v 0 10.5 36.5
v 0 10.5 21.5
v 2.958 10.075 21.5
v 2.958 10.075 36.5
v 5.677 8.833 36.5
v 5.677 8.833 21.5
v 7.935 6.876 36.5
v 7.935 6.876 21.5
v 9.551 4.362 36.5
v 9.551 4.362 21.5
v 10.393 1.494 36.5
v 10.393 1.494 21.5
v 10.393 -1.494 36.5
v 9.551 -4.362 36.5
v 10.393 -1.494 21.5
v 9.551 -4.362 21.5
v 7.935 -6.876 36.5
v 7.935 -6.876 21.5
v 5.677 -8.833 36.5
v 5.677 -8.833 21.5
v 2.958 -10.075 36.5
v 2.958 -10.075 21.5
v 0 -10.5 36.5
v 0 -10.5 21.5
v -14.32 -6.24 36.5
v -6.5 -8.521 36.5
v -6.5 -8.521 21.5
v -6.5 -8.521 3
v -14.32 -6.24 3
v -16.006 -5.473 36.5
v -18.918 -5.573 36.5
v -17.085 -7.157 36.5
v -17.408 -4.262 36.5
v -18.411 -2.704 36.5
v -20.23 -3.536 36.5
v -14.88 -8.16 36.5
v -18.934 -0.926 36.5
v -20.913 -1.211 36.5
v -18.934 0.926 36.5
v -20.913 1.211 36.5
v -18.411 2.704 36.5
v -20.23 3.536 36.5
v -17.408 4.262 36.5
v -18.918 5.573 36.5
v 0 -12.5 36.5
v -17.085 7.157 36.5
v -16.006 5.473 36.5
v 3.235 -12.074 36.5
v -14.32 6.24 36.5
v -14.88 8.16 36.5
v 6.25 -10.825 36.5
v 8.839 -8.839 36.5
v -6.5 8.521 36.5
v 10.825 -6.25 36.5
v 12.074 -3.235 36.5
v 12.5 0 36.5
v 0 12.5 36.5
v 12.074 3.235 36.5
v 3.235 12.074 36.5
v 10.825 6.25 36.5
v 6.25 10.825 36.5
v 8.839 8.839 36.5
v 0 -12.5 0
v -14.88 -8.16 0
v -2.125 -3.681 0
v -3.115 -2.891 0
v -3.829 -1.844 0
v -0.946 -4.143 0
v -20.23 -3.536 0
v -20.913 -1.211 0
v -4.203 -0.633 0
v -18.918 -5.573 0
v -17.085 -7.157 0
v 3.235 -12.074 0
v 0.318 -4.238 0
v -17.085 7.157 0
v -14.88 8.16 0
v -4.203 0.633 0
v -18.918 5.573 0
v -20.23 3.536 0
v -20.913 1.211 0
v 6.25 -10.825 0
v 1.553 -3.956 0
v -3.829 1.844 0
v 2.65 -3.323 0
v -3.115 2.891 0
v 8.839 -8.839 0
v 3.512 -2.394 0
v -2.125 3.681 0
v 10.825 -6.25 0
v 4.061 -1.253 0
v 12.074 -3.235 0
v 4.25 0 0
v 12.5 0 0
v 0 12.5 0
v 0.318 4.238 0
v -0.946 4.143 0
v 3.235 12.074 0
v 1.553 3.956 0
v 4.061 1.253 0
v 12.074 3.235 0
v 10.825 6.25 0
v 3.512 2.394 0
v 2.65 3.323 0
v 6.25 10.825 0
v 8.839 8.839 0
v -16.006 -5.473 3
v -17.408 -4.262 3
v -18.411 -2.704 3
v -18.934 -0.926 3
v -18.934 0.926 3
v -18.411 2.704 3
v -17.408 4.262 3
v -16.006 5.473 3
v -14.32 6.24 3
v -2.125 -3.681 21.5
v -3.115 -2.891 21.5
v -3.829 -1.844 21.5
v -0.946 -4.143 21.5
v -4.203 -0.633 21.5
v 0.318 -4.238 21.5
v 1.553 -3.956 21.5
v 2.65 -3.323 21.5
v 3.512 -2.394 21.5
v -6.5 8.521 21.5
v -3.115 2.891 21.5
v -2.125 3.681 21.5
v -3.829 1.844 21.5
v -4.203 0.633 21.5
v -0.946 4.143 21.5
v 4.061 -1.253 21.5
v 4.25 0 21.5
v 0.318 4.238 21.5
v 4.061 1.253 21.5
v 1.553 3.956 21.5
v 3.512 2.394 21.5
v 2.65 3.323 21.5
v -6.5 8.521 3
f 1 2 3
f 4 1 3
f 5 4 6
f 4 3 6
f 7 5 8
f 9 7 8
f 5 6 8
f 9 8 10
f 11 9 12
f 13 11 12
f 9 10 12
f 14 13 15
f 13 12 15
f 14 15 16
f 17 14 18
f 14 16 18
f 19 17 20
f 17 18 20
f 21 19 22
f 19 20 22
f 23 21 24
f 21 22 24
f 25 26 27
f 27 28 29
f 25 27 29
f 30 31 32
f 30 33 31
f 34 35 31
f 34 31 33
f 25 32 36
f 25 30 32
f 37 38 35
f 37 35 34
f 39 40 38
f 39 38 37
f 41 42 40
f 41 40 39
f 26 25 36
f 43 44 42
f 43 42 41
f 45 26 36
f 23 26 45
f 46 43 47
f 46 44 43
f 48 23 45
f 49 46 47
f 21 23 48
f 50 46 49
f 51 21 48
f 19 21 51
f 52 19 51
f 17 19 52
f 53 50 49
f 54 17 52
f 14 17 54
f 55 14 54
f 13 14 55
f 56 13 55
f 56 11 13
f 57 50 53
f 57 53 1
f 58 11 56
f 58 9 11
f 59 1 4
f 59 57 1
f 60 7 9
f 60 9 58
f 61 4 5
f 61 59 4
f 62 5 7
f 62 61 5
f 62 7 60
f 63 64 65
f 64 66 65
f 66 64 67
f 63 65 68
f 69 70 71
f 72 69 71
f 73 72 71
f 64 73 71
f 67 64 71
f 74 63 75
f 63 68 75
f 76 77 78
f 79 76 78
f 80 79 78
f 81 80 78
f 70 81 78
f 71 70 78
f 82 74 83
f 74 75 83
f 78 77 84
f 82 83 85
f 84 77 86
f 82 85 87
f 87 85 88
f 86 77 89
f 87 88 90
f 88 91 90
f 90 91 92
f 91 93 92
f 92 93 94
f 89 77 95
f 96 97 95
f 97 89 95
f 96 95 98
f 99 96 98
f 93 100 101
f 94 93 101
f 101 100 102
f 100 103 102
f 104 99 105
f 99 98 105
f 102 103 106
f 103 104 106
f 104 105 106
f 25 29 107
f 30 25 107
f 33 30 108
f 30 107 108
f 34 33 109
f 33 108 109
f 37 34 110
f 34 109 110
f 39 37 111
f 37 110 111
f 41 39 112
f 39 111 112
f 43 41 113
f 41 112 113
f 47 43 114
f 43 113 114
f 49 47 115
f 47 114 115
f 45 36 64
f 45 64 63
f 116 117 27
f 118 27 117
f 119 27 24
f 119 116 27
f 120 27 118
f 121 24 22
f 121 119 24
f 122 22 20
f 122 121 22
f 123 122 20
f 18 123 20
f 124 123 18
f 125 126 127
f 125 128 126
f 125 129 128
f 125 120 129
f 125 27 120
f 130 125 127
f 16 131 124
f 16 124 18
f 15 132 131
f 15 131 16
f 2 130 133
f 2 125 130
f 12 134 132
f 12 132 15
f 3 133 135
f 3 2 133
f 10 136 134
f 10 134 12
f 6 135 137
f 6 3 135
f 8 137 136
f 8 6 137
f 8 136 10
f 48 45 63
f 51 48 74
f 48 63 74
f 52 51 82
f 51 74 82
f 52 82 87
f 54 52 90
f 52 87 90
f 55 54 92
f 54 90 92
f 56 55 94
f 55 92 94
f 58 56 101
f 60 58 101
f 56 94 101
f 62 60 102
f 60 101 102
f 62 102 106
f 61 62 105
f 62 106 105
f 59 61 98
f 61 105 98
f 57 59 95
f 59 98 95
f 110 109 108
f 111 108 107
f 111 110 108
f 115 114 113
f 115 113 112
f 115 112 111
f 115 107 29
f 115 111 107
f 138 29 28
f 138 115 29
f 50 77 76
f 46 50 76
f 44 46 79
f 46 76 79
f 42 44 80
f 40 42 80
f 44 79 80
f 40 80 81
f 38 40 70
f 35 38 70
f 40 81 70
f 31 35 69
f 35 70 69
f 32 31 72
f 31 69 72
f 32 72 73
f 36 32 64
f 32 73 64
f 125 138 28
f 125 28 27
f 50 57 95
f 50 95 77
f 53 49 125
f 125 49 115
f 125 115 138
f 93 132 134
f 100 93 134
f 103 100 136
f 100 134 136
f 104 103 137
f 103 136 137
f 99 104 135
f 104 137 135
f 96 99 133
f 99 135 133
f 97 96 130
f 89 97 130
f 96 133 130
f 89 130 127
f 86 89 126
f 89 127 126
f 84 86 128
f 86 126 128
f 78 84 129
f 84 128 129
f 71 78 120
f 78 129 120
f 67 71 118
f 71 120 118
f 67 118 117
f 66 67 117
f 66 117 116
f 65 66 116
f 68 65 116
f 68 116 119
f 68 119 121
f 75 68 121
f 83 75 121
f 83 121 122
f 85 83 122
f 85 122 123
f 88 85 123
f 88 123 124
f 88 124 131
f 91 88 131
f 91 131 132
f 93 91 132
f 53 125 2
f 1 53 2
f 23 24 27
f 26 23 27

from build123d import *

# Parameters (mm, degrees)
F1_DEPTH  = 30
F3_DEPTH  = 27
F2_R      = 4
F5_DEPTH  = 6.5
F4_R      = 4.25
F4_R_2    = 4
F6_DEPTH  = 35.2
F7_DEPTH  = 10
F8_W      = 1
F8_H      = 16.5
F9_DEPTH  = 13.4
F11_DEPTH = 16
F12_DEPTH = 0.5
F13_R     = 1.25
F14_DEPTH = 25
F15_DEPTH = 2
F16_DEPTH = 18.5
F18_DEPTH = 15


with BuildPart() as f1:
    # F0 (on Top) → F1 (new body)
    with BuildSketch(Plane.XY):
        with BuildLine():
            ThreePointArc((-9.61, 7.9936162029), (-5.5424501439, 4.8828782496), (-4, 0))
            ThreePointArc((-4, 0), (-5.5424501439, -4.8828782496), (-9.61, -7.9936162029))
            ThreePointArc((-9.61, -7.9936162029), (-8.2636700449, -9.3787929602), (-6.72, -10.54))
            Line((-6.72, -10.54), (0, -12.5))
            ThreePointArc((0, -12.5), (8.8388347648, -8.8388347648), (12.5, 0))
            ThreePointArc((12.5, 0), (8.8388347648, 8.8388347648), (0, 12.5))
            Line((0, 12.5), (-6.72, 10.54))
            ThreePointArc((-6.72, 10.54), (-8.2636700449, 9.3787929602), (-9.61, 7.9936162029))
        make_face()
        with BuildLine():
            ThreePointArc((-4, 0), (0, 4), (4, 0))
            ThreePointArc((4, 0), (0, -4), (-4, 0))
        make_face(mode=Mode.SUBTRACT)
        with BuildLine():
            ThreePointArc((-9.61, -7.9936162029), (-5.5424501439, -4.8828782496), (-4, 0))
            ThreePointArc((-4, 0), (-5.5424501439, 4.8828782496), (-9.61, 7.9936162029))
            ThreePointArc((-9.61, 7.9936162029), (-12.5, 0), (-9.61, -7.9936162029))
        make_face()
        with BuildLine():
            ThreePointArc((-14.88, 8.16), (-12.231772686, 8.4957668346), (-9.61, 7.9936162029))
            ThreePointArc((-9.61, 7.9936162029), (-8.2636700449, 9.3787929602), (-6.72, 10.54))
            Line((-6.72, 10.54), (-14.88, 8.16))
        make_face()
        with BuildLine():
            ThreePointArc((-9.61, -7.9936162029), (-12.5, 0), (-9.61, 7.9936162029))
            ThreePointArc((-9.61, 7.9936162029), (-12.231772686, 8.4957668346), (-14.88, 8.16))
            ThreePointArc((-14.88, 8.16), (-21, 0), (-14.88, -8.16))
            ThreePointArc((-14.88, -8.16), (-12.231772686, -8.4957668346), (-9.61, -7.9936162029))
        make_face()
        with BuildLine():
            ThreePointArc((-6.72, -10.54), (-8.2636700449, -9.3787929602), (-9.61, -7.9936162029))
            ThreePointArc((-9.61, -7.9936162029), (-12.231772686, -8.4957668346), (-14.88, -8.16))
            Line((-14.88, -8.16), (-6.72, -10.54))
        make_face()
    extrude(amount=F1_DEPTH)

    # F2 (on face) → F3 (cut)
    with BuildSketch(Plane.XY.offset(30)):
        with BuildLine():
            Line((-14.32, -6.24), (-6.5, -8.5208333333))
            Line((-6.5, -8.5208333333), (-6.5, -6.5))
            Line((-6.5, -6.5), (-6.5, 6.5))
            Line((-6.5, 6.5), (-6.5, 8.5208333333))
            Line((-6.5, 8.5208333333), (-14.32, 6.24))
            ThreePointArc((-14.32, 6.24), (-19, 0), (-14.32, -6.24))
        make_face()
    extrude(amount=-F3_DEPTH, mode=Mode.SUBTRACT)

    # F2 (on face) → F5 (cut)
    with BuildSketch(Plane.XY.offset(30)):
        Polygon((-6.5, 6.5), (-6.5, -6.5), (6.5, -6.5), (10, 0), (6.5, 6.5), align=None)
        Circle(F2_R, mode=Mode.SUBTRACT)
    extrude(amount=-F5_DEPTH, mode=Mode.SUBTRACT)

    # F4 (on face) → F6 (cut)
    with BuildSketch(Plane.XY.offset(30)):
        Circle(F4_R)
        Circle(F4_R_2, mode=Mode.SUBTRACT)
    extrude(amount=-F6_DEPTH, mode=Mode.SUBTRACT)

    # F7 (add): a face of the model
    f7_faces = [f1.faces().sort_by_distance(p)[0] for p in [
        (-7.3229596651, 9.9287188517, 30),
    ]]
    extrude(f7_faces, amount=F7_DEPTH)

    # F8 (on face) → F9 (join)
    with BuildSketch(Plane.XZ.offset(-6.5)):
        with Locations((-6, 31.75)):
            Rectangle(F8_W, F8_H)
    extrude(amount=F9_DEPTH)

    # F10 (on face) → F11 (cut)
    with BuildSketch(Plane.XY.offset(40)):
        with BuildLine():
            Line((6.5, -6.5), (-5.5, -6.5))
            Line((-5.5, -6.5), (0, -12.5))
            ThreePointArc((0, -12.5), (12.5, 0), (0, 12.5))
            Line((0, 12.5), (-5.5, 6.5))
            Line((-5.5, 6.5), (6.5, 6.5))
            Line((6.5, 6.5), (10, 0))
            Line((10, 0), (6.5, -6.5))
        make_face()
    extrude(amount=-F11_DEPTH, mode=Mode.SUBTRACT)

    # F12 (cut): a face of the model
    f12_faces = [f1.faces().sort_by_distance(p)[0] for p in [
        (0.5, -6.808058436, 24),
    ]]
    extrude(f12_faces, amount=-F12_DEPTH, mode=Mode.SUBTRACT)

    # F13 (on face) → F14 (cut)
    with BuildSketch(Plane.YZ.offset(-5.5)):
        with Locations((0, 31.75)):
            Circle(F13_R)
    extrude(amount=-F14_DEPTH, mode=Mode.SUBTRACT)

    # F15 (cut): a face of the model
    f15_faces = [f1.faces().sort_by_distance(p)[0] for p in [
        (-2.5229134485, -9.2918373278, 23.5),
    ]]
    extrude(f15_faces, amount=-F15_DEPTH, mode=Mode.SUBTRACT)

    # F16 (cut): a face of the model
    f16_faces = [f1.faces().sort_by_distance(p)[0] for p in [
        (-2.9906782868, 9.7206217629, 40),
    ]]
    extrude(f16_faces, amount=-F16_DEPTH, mode=Mode.SUBTRACT)

    # F17 (on face) → F18 (join)
    with BuildSketch(Plane.XY.offset(21.5)):
        with BuildLine():
            ThreePointArc((-14.88, 8.16), (-21, 0), (-14.88, -8.16))
            Line((-14.88, -8.16), (0, -12.5))
            ThreePointArc((0, -12.5), (12.5, 0), (0, 12.5))
            Line((0, 12.5), (-14.88, 8.16))
        make_face()
        with BuildLine():
            ThreePointArc((0, 10.5), (10.5, 0), (0, -10.5))
            Line((0, -10.5), (-6.5, -8.5208333333))
            Line((-6.5, -8.5208333333), (-14.32, -6.24))
            ThreePointArc((-14.32, -6.24), (-19, 0), (-14.32, 6.24))
            Line((-14.32, 6.24), (-6.5, 8.5208333333))
            Line((-6.5, 8.5208333333), (0, 10.5))
        make_face(mode=Mode.SUBTRACT)
    extrude(amount=F18_DEPTH)


solid = f1.part
